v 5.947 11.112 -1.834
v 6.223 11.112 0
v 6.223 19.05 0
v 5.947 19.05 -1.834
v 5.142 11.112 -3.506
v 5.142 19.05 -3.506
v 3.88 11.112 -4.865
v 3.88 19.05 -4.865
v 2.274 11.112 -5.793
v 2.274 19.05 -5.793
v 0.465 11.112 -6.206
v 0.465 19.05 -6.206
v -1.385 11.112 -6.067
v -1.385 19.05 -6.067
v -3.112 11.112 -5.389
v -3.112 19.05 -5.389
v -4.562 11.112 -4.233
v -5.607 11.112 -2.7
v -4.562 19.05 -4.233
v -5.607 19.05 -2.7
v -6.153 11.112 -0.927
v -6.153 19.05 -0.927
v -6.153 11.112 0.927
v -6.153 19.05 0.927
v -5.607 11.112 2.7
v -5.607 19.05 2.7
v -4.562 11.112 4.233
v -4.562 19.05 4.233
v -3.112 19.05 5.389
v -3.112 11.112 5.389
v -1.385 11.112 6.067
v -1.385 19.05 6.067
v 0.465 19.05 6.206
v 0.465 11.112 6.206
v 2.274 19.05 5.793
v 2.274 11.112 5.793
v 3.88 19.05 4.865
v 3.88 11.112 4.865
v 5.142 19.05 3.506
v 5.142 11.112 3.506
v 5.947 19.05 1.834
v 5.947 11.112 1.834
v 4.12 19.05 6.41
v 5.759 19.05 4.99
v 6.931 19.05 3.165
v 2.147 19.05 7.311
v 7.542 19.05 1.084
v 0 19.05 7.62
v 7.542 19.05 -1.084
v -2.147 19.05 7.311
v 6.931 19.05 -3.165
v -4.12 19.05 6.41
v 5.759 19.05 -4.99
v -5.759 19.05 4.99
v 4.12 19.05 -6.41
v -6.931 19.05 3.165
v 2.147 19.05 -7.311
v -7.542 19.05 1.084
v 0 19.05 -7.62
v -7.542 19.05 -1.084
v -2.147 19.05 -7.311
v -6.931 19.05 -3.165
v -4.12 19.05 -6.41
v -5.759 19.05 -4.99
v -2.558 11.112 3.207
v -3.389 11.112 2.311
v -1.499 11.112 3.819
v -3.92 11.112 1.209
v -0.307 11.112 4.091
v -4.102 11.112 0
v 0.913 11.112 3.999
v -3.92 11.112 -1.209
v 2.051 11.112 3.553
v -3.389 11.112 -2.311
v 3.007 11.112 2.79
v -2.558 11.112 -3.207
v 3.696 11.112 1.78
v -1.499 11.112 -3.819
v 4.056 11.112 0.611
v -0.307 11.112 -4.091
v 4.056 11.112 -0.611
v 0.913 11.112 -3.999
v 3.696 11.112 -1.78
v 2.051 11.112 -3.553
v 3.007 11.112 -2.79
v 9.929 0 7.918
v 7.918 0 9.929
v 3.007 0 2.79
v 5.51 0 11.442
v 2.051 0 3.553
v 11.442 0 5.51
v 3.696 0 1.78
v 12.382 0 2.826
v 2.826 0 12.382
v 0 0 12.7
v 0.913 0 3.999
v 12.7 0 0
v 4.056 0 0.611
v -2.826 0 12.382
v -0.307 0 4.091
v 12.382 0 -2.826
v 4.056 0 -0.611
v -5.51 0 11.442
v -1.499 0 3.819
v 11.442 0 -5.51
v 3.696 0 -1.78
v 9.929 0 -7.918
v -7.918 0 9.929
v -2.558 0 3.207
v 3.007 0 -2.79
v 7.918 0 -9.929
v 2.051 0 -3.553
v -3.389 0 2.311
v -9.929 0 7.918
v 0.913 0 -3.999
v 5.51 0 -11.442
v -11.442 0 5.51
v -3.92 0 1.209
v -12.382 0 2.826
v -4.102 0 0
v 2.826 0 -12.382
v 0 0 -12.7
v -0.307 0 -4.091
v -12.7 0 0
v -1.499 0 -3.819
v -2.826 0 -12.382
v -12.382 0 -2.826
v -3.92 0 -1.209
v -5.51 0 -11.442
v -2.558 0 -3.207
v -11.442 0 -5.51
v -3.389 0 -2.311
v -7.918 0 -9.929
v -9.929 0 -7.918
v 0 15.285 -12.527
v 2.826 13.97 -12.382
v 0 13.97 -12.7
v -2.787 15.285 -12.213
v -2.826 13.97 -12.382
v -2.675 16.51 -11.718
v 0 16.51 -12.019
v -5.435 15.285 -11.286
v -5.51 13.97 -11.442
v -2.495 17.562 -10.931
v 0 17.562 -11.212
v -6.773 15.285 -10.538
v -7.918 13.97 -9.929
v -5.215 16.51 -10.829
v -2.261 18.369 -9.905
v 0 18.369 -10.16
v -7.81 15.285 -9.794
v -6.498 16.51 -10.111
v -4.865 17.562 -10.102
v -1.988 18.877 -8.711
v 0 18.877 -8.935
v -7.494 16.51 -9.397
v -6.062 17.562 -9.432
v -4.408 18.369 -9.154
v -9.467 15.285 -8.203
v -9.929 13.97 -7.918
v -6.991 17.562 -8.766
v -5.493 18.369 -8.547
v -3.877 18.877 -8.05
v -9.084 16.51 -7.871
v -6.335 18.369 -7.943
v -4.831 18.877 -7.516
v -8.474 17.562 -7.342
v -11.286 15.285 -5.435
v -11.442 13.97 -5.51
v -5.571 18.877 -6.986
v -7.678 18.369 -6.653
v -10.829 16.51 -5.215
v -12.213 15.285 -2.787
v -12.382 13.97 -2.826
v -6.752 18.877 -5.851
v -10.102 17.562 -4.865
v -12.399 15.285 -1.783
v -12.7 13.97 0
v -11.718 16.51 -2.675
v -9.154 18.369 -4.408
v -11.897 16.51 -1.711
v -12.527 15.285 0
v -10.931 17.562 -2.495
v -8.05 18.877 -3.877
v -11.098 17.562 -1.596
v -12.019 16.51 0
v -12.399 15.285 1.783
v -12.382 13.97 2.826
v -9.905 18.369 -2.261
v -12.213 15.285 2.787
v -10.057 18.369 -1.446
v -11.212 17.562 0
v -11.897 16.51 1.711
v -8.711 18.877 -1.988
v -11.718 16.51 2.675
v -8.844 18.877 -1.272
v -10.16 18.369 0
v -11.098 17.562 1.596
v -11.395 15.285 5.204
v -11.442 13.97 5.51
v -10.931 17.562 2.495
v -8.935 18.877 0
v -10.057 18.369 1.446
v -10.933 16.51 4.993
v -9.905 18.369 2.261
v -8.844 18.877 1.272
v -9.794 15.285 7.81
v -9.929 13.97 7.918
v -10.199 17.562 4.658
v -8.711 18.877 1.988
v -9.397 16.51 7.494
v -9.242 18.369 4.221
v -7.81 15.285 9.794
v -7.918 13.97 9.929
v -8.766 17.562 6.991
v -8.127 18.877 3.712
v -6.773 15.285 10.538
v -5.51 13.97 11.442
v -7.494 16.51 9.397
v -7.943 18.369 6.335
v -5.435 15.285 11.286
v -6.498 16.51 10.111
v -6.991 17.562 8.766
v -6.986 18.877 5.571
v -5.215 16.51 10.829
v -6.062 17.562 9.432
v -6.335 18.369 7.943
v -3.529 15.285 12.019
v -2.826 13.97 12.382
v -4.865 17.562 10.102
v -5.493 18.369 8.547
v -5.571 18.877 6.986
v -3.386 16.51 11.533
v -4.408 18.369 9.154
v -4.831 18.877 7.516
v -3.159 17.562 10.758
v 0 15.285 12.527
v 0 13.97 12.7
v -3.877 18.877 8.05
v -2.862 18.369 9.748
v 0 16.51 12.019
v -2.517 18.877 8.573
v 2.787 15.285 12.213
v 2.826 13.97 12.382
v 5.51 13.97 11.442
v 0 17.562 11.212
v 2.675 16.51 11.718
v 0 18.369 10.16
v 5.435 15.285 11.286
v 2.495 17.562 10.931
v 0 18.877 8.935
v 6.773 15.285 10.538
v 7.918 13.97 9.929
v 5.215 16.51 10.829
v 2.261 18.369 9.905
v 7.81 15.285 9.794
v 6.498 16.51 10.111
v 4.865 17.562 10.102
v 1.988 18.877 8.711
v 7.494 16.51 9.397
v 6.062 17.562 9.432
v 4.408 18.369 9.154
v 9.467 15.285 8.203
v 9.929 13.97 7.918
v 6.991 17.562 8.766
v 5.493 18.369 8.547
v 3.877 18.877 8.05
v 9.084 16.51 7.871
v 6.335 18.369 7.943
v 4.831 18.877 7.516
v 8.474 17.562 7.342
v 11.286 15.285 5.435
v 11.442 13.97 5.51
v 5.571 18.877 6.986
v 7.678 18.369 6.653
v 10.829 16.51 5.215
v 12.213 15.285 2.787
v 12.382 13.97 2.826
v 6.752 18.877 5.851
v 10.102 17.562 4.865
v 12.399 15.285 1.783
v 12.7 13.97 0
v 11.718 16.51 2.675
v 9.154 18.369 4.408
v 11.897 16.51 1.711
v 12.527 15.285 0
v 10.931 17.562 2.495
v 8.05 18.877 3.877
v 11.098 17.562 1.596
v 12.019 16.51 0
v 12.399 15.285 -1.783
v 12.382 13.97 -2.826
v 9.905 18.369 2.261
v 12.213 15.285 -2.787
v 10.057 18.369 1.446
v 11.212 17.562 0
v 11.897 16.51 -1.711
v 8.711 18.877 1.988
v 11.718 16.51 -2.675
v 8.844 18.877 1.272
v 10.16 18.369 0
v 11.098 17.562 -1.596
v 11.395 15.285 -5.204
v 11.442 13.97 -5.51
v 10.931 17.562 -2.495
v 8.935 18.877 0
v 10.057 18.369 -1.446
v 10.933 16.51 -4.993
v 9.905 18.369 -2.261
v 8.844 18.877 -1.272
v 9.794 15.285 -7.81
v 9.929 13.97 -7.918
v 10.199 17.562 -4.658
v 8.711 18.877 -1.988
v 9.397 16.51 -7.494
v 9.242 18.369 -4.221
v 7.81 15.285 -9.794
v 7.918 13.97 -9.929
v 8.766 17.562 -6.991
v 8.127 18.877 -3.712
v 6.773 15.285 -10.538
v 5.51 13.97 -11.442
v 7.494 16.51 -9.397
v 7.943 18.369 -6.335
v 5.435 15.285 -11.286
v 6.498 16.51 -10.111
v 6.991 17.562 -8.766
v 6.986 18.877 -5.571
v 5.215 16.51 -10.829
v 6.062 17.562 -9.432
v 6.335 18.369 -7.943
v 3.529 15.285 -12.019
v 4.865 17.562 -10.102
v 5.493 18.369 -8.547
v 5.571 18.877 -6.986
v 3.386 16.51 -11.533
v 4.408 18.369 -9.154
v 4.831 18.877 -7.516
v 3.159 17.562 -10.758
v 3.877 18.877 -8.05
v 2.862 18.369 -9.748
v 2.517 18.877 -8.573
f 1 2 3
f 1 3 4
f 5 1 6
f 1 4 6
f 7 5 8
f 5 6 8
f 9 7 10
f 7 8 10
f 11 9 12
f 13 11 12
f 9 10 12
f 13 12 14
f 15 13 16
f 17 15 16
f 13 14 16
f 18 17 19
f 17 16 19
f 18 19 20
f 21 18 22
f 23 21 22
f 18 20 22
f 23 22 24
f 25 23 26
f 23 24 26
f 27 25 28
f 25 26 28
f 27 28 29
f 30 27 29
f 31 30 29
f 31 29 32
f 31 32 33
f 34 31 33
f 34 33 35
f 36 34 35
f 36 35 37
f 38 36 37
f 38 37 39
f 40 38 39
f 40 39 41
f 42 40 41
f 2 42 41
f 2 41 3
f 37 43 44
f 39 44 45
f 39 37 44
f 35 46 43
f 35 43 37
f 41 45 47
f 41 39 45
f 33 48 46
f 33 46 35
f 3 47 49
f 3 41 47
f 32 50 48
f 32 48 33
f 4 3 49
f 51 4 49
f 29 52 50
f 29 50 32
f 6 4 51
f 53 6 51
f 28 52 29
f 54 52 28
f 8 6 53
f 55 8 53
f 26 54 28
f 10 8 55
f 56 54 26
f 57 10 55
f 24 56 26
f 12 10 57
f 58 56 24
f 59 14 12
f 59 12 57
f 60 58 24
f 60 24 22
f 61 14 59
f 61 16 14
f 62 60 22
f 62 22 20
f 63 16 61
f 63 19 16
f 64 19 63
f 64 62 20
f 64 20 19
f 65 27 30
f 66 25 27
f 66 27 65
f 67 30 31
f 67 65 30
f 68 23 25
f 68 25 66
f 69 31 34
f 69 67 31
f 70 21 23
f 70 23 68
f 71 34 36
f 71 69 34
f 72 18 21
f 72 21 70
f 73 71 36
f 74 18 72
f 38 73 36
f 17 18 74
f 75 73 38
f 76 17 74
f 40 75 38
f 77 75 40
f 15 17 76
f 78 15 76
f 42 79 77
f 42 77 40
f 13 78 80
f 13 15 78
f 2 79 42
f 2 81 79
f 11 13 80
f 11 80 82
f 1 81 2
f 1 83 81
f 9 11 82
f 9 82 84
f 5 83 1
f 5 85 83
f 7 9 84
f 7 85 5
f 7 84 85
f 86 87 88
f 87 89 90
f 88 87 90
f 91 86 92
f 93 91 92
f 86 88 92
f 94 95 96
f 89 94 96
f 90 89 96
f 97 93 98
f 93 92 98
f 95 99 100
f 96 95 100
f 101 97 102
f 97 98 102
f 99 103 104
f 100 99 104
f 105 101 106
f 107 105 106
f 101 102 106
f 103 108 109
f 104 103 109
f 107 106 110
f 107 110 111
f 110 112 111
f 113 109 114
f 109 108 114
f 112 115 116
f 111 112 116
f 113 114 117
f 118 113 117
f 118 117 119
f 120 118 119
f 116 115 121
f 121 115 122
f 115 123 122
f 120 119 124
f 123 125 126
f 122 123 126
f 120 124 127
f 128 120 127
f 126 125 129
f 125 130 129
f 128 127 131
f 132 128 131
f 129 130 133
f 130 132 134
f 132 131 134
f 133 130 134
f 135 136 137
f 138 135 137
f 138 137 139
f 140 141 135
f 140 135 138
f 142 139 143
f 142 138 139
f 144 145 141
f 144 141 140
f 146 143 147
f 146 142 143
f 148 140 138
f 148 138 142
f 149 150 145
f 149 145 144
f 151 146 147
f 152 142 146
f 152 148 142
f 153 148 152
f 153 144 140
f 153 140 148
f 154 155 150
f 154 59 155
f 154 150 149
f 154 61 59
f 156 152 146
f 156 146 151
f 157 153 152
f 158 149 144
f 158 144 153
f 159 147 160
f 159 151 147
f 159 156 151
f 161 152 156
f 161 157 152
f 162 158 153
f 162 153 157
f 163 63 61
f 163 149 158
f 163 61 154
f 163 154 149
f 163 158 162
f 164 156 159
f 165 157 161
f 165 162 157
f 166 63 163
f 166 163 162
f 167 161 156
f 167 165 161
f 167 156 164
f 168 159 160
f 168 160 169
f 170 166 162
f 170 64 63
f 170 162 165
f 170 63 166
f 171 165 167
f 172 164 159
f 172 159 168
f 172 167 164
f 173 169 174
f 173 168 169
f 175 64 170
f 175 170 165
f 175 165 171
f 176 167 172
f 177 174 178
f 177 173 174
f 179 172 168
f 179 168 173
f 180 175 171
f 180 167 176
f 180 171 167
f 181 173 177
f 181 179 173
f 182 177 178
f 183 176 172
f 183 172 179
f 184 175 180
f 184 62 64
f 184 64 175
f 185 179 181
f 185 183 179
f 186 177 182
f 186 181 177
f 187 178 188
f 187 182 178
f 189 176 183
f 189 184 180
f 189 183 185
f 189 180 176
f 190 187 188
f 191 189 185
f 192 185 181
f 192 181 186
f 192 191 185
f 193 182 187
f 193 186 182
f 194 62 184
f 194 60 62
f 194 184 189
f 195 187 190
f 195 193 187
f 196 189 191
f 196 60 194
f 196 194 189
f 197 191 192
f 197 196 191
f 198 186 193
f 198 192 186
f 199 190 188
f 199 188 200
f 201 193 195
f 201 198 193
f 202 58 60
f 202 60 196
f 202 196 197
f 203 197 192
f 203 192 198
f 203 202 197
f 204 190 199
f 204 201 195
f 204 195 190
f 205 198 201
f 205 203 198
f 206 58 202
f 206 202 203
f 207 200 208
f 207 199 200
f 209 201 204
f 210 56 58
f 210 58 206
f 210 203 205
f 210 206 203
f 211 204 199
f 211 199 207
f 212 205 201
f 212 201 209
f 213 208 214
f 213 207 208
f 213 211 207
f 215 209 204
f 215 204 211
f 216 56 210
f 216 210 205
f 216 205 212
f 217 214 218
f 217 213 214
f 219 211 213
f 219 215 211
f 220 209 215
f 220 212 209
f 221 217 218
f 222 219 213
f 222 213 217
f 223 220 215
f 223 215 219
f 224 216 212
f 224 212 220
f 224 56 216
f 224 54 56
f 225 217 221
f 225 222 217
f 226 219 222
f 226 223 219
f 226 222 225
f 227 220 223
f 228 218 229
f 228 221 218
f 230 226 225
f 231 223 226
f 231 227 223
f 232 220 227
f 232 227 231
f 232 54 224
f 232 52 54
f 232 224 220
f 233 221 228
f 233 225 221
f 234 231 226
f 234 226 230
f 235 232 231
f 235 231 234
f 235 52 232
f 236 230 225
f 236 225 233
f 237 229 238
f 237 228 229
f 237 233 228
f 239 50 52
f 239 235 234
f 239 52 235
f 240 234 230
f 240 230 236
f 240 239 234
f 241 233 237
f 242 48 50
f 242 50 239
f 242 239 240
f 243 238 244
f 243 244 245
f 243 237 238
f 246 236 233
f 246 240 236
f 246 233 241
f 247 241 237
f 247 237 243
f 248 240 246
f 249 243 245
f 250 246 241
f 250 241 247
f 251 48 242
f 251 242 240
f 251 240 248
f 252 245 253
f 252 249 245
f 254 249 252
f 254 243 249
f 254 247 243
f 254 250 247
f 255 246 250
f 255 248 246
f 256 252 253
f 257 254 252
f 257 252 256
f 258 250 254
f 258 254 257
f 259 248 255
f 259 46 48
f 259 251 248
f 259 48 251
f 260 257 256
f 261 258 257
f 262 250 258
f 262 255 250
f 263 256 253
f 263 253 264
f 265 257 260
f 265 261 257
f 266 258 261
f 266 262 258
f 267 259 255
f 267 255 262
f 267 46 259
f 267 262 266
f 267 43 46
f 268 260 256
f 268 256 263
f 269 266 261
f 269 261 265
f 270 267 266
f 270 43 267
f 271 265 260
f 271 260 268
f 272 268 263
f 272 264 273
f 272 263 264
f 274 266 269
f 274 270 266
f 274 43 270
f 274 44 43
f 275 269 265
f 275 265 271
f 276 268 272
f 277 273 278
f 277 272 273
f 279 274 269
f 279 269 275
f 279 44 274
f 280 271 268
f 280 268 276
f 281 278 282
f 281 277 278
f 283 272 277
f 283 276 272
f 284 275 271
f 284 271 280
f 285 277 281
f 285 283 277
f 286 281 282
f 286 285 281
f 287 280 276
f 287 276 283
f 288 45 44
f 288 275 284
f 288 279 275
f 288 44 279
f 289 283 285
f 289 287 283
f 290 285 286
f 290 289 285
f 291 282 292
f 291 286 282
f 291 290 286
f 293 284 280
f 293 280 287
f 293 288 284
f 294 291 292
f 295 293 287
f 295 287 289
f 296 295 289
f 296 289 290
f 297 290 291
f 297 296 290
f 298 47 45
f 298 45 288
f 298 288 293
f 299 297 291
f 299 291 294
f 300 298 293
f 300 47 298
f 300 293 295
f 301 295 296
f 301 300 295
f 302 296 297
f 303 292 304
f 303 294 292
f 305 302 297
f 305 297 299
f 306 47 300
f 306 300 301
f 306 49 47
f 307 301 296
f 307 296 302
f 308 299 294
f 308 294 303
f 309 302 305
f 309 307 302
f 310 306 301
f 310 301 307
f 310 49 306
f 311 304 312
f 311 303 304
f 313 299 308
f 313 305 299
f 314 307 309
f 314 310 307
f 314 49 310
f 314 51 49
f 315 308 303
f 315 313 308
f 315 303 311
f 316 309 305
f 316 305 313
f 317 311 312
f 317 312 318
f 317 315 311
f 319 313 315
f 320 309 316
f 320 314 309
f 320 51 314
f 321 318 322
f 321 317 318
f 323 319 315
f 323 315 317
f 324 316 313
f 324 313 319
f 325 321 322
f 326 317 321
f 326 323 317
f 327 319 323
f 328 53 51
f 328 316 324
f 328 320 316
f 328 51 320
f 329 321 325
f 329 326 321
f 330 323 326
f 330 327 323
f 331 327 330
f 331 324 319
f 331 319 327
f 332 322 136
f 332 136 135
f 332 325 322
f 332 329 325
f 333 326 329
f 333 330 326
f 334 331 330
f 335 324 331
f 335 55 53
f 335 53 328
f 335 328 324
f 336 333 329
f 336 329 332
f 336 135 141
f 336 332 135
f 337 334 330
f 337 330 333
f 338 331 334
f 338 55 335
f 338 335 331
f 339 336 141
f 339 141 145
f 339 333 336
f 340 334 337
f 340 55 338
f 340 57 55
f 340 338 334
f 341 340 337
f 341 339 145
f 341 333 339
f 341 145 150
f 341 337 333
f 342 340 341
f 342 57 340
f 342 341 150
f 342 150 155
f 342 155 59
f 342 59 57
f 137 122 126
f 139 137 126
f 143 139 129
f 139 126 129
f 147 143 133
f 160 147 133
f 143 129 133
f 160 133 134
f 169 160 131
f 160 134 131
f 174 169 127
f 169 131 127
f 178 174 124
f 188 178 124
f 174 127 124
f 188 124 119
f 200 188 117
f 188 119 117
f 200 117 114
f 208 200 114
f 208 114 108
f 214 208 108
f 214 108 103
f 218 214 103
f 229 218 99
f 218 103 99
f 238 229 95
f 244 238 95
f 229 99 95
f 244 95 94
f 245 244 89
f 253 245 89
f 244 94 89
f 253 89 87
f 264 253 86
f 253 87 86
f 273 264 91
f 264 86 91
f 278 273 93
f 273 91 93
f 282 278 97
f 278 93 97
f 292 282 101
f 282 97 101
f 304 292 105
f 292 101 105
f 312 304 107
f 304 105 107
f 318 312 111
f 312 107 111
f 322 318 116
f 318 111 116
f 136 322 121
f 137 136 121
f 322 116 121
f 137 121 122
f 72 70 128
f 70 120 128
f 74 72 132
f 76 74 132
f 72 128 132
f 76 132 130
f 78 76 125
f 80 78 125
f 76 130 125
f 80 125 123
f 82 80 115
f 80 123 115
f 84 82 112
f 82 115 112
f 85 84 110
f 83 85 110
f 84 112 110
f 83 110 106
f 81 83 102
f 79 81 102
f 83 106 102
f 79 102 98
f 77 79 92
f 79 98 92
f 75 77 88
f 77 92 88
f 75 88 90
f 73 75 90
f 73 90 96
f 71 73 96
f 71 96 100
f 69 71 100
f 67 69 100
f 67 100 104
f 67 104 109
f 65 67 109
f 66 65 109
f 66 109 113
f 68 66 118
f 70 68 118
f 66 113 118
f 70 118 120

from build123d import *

# Parameters (mm, degrees)
CROQUIS1_R                                           = 12.7
SALIENTE_EXTRUIR1_DEPTH                              = 19.05
REFRENTADO_PARA_TORNILLO_CON_CABEZA_HUEC_D           = 8.2042
REFRENTADO_PARA_TORNILLO_CON_CABEZA_HUEC_DEPTH       = 19.7485
REFRENTADO_PARA_TORNILLO_CON_CABEZA_HUEC_CBORE_D     = 12.446
REFRENTADO_PARA_TORNILLO_CON_CABEZA_HUEC_CBORE_DEPTH = 7.9375
REFRENTADO_PARA_TORNILLO_CON_CABEZA_HUEC_TIP         = 2.464790345
REDONDEO1_R                                          = 5.08


with BuildPart() as part:
    # Croquis1 → Saliente-Extruir1 (new body)
    with BuildSketch(Plane(origin=(0, 0, 0), x_dir=(1, 0, 0), z_dir=(0, 1, 0))):
        with Locations(Location((0, 0, 0), (0, 0, 90))):
            Circle(CROQUIS1_R)
    extrude(amount=SALIENTE_EXTRUIR1_DEPTH)

    # Refrentado para tornillo con cabeza hueca de 5/161
    with Locations(Plane(origin=(0, 19.05, 0), x_dir=(1, 0, 0), z_dir=(0, 1, 0))):
        with Locations((0, 0)):
            CounterBoreHole(REFRENTADO_PARA_TORNILLO_CON_CABEZA_HUEC_D / 2, REFRENTADO_PARA_TORNILLO_CON_CABEZA_HUEC_CBORE_D / 2, REFRENTADO_PARA_TORNILLO_CON_CABEZA_HUEC_CBORE_DEPTH, depth=REFRENTADO_PARA_TORNILLO_CON_CABEZA_HUEC_DEPTH)
            with Locations((0, 0, -(REFRENTADO_PARA_TORNILLO_CON_CABEZA_HUEC_DEPTH + REFRENTADO_PARA_TORNILLO_CON_CABEZA_HUEC_TIP / 2))):  # 118° drill point
                Cone(0, REFRENTADO_PARA_TORNILLO_CON_CABEZA_HUEC_D / 2, REFRENTADO_PARA_TORNILLO_CON_CABEZA_HUEC_TIP, mode=Mode.SUBTRACT)

    # Redondeo1
    redondeo1_edges = [part.edges().sort_by_distance(p)[0] for p in [
        (0, 19.05, 12.7),
    ]]
    fillet(redondeo1_edges, radius=REDONDEO1_R)


solid = part.part
